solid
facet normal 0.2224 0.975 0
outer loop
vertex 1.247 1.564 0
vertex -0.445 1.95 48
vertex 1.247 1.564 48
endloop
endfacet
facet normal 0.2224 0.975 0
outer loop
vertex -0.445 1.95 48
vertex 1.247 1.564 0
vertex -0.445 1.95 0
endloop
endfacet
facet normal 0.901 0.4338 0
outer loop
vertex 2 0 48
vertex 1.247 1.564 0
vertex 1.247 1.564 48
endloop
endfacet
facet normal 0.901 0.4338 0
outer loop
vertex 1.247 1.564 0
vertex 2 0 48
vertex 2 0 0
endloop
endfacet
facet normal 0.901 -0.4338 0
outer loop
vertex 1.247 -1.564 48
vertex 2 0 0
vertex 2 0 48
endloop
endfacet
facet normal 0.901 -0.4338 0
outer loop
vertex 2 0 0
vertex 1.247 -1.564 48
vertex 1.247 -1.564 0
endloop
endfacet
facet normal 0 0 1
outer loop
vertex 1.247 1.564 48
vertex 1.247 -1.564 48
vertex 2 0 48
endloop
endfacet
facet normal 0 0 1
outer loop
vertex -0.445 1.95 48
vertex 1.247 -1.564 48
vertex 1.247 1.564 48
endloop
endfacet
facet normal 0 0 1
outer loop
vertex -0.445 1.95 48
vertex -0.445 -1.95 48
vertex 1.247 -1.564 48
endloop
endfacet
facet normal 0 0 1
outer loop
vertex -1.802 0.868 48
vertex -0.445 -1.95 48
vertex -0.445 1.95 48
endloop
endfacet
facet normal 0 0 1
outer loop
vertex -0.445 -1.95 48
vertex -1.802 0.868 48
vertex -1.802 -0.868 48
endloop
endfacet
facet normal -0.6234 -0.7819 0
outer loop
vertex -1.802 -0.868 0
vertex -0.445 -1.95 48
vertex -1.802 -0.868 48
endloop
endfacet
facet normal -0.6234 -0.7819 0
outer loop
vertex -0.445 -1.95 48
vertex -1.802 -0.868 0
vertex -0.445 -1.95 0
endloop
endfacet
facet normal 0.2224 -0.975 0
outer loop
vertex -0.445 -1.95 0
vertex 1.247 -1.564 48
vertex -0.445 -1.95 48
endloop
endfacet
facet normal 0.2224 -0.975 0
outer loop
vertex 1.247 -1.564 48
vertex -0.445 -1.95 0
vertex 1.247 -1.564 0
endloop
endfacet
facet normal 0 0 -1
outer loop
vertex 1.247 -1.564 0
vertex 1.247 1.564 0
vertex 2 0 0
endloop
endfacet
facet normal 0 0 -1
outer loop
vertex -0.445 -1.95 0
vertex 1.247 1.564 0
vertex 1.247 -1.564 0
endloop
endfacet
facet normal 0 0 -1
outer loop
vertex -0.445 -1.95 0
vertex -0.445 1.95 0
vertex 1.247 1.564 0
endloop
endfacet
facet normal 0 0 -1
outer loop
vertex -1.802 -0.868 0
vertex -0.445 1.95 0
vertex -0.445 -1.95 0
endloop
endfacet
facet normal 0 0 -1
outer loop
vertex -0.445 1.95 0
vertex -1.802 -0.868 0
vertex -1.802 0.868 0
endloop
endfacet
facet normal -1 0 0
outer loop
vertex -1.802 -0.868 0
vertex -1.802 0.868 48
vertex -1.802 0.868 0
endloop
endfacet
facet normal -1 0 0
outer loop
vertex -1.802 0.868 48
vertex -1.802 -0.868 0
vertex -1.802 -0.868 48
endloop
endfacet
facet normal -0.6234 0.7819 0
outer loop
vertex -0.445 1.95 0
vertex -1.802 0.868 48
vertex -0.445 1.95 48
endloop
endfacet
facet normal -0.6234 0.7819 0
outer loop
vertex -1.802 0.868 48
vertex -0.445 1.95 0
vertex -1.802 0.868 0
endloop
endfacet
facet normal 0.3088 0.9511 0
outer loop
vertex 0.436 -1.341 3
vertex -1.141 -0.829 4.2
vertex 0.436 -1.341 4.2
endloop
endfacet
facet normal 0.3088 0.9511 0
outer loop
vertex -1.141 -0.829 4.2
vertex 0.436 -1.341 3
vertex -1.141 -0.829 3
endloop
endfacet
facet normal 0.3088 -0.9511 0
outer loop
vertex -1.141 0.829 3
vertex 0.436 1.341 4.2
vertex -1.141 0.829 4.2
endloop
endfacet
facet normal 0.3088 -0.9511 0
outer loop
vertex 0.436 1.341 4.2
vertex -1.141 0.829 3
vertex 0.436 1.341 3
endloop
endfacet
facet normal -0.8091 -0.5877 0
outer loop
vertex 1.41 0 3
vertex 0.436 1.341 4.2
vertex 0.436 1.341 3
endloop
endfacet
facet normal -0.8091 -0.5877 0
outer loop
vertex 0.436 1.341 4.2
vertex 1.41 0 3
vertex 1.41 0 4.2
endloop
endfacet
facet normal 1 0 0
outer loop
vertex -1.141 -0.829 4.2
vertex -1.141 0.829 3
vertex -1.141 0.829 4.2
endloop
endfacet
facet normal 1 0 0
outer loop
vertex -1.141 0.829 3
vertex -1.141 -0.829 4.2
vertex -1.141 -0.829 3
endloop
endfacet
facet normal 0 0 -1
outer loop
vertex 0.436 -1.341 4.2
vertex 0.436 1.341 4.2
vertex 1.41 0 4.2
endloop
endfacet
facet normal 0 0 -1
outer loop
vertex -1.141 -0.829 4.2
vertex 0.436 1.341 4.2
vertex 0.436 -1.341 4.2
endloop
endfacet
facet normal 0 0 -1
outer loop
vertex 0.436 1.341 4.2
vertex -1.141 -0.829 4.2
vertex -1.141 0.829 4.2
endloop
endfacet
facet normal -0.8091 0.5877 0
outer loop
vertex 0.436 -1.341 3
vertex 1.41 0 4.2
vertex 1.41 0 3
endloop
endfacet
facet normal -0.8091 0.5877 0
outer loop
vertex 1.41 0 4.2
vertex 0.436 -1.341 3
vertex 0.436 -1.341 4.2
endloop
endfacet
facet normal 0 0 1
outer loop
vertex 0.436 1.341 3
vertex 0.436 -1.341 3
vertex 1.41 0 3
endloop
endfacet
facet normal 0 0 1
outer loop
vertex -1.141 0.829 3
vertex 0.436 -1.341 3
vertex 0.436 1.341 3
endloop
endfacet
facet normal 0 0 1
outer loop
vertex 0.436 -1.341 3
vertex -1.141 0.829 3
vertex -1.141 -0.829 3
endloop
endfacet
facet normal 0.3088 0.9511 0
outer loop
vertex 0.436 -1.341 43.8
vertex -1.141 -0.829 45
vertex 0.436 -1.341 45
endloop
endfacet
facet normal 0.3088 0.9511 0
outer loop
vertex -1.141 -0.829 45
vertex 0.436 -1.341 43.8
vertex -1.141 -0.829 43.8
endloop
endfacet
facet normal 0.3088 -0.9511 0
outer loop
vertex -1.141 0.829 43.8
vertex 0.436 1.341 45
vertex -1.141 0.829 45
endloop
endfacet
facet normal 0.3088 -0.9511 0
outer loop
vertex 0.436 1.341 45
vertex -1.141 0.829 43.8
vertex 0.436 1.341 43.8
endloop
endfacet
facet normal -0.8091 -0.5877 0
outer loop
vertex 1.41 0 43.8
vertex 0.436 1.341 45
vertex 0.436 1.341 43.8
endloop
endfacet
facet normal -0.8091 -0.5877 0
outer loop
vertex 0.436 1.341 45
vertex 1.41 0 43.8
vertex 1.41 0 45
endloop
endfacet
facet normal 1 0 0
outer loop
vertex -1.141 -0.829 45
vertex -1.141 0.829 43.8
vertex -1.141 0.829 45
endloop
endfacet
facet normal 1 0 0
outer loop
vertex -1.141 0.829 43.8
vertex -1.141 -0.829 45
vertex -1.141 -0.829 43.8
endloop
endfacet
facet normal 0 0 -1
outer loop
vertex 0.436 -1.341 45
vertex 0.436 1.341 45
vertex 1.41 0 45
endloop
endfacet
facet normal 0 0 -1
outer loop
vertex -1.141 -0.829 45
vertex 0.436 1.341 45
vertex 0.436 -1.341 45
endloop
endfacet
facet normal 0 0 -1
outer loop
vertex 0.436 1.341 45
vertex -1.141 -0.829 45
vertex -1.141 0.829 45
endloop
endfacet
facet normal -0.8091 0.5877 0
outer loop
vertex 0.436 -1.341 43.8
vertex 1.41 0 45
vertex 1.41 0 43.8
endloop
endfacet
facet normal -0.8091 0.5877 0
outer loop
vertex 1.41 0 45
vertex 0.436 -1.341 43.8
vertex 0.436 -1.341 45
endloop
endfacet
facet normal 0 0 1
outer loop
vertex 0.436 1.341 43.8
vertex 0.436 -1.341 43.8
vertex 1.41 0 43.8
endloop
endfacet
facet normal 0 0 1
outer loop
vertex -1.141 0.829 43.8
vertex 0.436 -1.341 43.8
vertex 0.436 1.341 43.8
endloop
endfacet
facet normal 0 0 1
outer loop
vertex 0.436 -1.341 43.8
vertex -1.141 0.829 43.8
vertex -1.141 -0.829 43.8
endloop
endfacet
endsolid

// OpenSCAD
// Fidget Tank Mechanical Monster — OpenSCAD parametric twin
// Mirrors CadQuery hole-compensation strategy for axle/clip pairs.
// All 13 BOM components selectable via `component_id`.

/* [Global Tolerance] */
printer_hole_compensation = 0.15; // mm — expands female bores
pin_od_nominal = 4.0;
clip_groove_depth = 0.6;

/* [Component Select] */
// "01".."13" matching docs/bom/fidget_tank_bom.json
component_id = "06";

function bore(n) = n + printer_hole_compensation;
function pin_od(n) = n;

module chassis() {
  cube([80, 40, 12], center = true);
  for (x = [-25, 25], y = [-18, 18])
    translate([x, y, 6]) cylinder(h = 8, r = 3);
}

module track_pod() {
  difference() {
    cube([50, 14, 18], center = true);
    for (x = [-15, 0, 15])
      translate([x, 0, 0]) rotate([90, 0, 0])
        cylinder(h = 16, r = bore(pin_od_nominal) / 2, center = true);
  }
}

module road_wheel() {
  difference() {
    cylinder(h = 4, r = 8);
    translate([0, 0, -0.1])
      cylinder(h = 4.2, r = bore(pin_od_nominal) / 2);
  }
}

module axle_c_clip() {
  od = pin_od(pin_od_nominal);
  groove_od = od - 2 * clip_groove_depth;
  difference() {
    cylinder(h = 1.0, r = groove_od / 2 + 1.2);
    translate([0, 0, -0.1]) cylinder(h = 1.2, r = groove_od / 2);
    translate([groove_od / 2 + 1.2, 0, 0.5]) cube([groove_od + 2.4, 1.2, 1.2], center = true);
  }
}

module axle_pin() {
  od = pin_od(pin_od_nominal);
  length = 48;
  difference() {
    cylinder(h = length, r = od / 2);
    translate([0, 0, 3])
      cylinder(h = 1.2, r = od / 2 - clip_groove_depth + 0.01);
    translate([0, 0, length - 4.2])
      cylinder(h = 1.2, r = od / 2 - clip_groove_depth + 0.01);
  }
}

module drive_sprocket() {
  difference() {
    union() {
      cylinder(h = 5, r = 10);
      cylinder(h = 5, r = 12, $fn = 8);
    }
    translate([0, 0, -0.1])
      cylinder(h = 5.2, r = bore(pin_od_nominal) / 2);
  }
}

module track_segment() {
  difference() {
    cube([10, 8, 4], center = true);
    rotate([0, 90, 0])
      cylinder(h = 12, r = 1.0 + printer_hole_compensation * 0.25, center = true);
  }
}

module clicker_leaf() {
  // PETG only — enforced in /config slicing profiles
  cube([30, 8, 1.2], center = true);
}

module turret() { cylinder(h = 10, r = 14); }
module barrel() { cylinder(h = 28, r = 3); }
module hatch_cover() { scale([8, 6, 1]) cylinder(h = 2, r = 1); }

module select_component(id) {
  if (id == "01") chassis();
  else if (id == "02") track_pod();
  else if (id == "03") mirror([1, 0, 0]) track_pod();
  else if (id == "04") road_wheel();
  else if (id == "05") axle_c_clip();
  else if (id == "06") axle_pin();
  else if (id == "07") drive_sprocket();
  else if (id == "08") drive_sprocket();
  else if (id == "09") track_segment();
  else if (id == "10") clicker_leaf();
  else if (id == "11") turret();
  else if (id == "12") barrel();
  else if (id == "13") hatch_cover();
  else assert(false, "Unknown component_id — must be 01..13");
}

select_component(component_id);
